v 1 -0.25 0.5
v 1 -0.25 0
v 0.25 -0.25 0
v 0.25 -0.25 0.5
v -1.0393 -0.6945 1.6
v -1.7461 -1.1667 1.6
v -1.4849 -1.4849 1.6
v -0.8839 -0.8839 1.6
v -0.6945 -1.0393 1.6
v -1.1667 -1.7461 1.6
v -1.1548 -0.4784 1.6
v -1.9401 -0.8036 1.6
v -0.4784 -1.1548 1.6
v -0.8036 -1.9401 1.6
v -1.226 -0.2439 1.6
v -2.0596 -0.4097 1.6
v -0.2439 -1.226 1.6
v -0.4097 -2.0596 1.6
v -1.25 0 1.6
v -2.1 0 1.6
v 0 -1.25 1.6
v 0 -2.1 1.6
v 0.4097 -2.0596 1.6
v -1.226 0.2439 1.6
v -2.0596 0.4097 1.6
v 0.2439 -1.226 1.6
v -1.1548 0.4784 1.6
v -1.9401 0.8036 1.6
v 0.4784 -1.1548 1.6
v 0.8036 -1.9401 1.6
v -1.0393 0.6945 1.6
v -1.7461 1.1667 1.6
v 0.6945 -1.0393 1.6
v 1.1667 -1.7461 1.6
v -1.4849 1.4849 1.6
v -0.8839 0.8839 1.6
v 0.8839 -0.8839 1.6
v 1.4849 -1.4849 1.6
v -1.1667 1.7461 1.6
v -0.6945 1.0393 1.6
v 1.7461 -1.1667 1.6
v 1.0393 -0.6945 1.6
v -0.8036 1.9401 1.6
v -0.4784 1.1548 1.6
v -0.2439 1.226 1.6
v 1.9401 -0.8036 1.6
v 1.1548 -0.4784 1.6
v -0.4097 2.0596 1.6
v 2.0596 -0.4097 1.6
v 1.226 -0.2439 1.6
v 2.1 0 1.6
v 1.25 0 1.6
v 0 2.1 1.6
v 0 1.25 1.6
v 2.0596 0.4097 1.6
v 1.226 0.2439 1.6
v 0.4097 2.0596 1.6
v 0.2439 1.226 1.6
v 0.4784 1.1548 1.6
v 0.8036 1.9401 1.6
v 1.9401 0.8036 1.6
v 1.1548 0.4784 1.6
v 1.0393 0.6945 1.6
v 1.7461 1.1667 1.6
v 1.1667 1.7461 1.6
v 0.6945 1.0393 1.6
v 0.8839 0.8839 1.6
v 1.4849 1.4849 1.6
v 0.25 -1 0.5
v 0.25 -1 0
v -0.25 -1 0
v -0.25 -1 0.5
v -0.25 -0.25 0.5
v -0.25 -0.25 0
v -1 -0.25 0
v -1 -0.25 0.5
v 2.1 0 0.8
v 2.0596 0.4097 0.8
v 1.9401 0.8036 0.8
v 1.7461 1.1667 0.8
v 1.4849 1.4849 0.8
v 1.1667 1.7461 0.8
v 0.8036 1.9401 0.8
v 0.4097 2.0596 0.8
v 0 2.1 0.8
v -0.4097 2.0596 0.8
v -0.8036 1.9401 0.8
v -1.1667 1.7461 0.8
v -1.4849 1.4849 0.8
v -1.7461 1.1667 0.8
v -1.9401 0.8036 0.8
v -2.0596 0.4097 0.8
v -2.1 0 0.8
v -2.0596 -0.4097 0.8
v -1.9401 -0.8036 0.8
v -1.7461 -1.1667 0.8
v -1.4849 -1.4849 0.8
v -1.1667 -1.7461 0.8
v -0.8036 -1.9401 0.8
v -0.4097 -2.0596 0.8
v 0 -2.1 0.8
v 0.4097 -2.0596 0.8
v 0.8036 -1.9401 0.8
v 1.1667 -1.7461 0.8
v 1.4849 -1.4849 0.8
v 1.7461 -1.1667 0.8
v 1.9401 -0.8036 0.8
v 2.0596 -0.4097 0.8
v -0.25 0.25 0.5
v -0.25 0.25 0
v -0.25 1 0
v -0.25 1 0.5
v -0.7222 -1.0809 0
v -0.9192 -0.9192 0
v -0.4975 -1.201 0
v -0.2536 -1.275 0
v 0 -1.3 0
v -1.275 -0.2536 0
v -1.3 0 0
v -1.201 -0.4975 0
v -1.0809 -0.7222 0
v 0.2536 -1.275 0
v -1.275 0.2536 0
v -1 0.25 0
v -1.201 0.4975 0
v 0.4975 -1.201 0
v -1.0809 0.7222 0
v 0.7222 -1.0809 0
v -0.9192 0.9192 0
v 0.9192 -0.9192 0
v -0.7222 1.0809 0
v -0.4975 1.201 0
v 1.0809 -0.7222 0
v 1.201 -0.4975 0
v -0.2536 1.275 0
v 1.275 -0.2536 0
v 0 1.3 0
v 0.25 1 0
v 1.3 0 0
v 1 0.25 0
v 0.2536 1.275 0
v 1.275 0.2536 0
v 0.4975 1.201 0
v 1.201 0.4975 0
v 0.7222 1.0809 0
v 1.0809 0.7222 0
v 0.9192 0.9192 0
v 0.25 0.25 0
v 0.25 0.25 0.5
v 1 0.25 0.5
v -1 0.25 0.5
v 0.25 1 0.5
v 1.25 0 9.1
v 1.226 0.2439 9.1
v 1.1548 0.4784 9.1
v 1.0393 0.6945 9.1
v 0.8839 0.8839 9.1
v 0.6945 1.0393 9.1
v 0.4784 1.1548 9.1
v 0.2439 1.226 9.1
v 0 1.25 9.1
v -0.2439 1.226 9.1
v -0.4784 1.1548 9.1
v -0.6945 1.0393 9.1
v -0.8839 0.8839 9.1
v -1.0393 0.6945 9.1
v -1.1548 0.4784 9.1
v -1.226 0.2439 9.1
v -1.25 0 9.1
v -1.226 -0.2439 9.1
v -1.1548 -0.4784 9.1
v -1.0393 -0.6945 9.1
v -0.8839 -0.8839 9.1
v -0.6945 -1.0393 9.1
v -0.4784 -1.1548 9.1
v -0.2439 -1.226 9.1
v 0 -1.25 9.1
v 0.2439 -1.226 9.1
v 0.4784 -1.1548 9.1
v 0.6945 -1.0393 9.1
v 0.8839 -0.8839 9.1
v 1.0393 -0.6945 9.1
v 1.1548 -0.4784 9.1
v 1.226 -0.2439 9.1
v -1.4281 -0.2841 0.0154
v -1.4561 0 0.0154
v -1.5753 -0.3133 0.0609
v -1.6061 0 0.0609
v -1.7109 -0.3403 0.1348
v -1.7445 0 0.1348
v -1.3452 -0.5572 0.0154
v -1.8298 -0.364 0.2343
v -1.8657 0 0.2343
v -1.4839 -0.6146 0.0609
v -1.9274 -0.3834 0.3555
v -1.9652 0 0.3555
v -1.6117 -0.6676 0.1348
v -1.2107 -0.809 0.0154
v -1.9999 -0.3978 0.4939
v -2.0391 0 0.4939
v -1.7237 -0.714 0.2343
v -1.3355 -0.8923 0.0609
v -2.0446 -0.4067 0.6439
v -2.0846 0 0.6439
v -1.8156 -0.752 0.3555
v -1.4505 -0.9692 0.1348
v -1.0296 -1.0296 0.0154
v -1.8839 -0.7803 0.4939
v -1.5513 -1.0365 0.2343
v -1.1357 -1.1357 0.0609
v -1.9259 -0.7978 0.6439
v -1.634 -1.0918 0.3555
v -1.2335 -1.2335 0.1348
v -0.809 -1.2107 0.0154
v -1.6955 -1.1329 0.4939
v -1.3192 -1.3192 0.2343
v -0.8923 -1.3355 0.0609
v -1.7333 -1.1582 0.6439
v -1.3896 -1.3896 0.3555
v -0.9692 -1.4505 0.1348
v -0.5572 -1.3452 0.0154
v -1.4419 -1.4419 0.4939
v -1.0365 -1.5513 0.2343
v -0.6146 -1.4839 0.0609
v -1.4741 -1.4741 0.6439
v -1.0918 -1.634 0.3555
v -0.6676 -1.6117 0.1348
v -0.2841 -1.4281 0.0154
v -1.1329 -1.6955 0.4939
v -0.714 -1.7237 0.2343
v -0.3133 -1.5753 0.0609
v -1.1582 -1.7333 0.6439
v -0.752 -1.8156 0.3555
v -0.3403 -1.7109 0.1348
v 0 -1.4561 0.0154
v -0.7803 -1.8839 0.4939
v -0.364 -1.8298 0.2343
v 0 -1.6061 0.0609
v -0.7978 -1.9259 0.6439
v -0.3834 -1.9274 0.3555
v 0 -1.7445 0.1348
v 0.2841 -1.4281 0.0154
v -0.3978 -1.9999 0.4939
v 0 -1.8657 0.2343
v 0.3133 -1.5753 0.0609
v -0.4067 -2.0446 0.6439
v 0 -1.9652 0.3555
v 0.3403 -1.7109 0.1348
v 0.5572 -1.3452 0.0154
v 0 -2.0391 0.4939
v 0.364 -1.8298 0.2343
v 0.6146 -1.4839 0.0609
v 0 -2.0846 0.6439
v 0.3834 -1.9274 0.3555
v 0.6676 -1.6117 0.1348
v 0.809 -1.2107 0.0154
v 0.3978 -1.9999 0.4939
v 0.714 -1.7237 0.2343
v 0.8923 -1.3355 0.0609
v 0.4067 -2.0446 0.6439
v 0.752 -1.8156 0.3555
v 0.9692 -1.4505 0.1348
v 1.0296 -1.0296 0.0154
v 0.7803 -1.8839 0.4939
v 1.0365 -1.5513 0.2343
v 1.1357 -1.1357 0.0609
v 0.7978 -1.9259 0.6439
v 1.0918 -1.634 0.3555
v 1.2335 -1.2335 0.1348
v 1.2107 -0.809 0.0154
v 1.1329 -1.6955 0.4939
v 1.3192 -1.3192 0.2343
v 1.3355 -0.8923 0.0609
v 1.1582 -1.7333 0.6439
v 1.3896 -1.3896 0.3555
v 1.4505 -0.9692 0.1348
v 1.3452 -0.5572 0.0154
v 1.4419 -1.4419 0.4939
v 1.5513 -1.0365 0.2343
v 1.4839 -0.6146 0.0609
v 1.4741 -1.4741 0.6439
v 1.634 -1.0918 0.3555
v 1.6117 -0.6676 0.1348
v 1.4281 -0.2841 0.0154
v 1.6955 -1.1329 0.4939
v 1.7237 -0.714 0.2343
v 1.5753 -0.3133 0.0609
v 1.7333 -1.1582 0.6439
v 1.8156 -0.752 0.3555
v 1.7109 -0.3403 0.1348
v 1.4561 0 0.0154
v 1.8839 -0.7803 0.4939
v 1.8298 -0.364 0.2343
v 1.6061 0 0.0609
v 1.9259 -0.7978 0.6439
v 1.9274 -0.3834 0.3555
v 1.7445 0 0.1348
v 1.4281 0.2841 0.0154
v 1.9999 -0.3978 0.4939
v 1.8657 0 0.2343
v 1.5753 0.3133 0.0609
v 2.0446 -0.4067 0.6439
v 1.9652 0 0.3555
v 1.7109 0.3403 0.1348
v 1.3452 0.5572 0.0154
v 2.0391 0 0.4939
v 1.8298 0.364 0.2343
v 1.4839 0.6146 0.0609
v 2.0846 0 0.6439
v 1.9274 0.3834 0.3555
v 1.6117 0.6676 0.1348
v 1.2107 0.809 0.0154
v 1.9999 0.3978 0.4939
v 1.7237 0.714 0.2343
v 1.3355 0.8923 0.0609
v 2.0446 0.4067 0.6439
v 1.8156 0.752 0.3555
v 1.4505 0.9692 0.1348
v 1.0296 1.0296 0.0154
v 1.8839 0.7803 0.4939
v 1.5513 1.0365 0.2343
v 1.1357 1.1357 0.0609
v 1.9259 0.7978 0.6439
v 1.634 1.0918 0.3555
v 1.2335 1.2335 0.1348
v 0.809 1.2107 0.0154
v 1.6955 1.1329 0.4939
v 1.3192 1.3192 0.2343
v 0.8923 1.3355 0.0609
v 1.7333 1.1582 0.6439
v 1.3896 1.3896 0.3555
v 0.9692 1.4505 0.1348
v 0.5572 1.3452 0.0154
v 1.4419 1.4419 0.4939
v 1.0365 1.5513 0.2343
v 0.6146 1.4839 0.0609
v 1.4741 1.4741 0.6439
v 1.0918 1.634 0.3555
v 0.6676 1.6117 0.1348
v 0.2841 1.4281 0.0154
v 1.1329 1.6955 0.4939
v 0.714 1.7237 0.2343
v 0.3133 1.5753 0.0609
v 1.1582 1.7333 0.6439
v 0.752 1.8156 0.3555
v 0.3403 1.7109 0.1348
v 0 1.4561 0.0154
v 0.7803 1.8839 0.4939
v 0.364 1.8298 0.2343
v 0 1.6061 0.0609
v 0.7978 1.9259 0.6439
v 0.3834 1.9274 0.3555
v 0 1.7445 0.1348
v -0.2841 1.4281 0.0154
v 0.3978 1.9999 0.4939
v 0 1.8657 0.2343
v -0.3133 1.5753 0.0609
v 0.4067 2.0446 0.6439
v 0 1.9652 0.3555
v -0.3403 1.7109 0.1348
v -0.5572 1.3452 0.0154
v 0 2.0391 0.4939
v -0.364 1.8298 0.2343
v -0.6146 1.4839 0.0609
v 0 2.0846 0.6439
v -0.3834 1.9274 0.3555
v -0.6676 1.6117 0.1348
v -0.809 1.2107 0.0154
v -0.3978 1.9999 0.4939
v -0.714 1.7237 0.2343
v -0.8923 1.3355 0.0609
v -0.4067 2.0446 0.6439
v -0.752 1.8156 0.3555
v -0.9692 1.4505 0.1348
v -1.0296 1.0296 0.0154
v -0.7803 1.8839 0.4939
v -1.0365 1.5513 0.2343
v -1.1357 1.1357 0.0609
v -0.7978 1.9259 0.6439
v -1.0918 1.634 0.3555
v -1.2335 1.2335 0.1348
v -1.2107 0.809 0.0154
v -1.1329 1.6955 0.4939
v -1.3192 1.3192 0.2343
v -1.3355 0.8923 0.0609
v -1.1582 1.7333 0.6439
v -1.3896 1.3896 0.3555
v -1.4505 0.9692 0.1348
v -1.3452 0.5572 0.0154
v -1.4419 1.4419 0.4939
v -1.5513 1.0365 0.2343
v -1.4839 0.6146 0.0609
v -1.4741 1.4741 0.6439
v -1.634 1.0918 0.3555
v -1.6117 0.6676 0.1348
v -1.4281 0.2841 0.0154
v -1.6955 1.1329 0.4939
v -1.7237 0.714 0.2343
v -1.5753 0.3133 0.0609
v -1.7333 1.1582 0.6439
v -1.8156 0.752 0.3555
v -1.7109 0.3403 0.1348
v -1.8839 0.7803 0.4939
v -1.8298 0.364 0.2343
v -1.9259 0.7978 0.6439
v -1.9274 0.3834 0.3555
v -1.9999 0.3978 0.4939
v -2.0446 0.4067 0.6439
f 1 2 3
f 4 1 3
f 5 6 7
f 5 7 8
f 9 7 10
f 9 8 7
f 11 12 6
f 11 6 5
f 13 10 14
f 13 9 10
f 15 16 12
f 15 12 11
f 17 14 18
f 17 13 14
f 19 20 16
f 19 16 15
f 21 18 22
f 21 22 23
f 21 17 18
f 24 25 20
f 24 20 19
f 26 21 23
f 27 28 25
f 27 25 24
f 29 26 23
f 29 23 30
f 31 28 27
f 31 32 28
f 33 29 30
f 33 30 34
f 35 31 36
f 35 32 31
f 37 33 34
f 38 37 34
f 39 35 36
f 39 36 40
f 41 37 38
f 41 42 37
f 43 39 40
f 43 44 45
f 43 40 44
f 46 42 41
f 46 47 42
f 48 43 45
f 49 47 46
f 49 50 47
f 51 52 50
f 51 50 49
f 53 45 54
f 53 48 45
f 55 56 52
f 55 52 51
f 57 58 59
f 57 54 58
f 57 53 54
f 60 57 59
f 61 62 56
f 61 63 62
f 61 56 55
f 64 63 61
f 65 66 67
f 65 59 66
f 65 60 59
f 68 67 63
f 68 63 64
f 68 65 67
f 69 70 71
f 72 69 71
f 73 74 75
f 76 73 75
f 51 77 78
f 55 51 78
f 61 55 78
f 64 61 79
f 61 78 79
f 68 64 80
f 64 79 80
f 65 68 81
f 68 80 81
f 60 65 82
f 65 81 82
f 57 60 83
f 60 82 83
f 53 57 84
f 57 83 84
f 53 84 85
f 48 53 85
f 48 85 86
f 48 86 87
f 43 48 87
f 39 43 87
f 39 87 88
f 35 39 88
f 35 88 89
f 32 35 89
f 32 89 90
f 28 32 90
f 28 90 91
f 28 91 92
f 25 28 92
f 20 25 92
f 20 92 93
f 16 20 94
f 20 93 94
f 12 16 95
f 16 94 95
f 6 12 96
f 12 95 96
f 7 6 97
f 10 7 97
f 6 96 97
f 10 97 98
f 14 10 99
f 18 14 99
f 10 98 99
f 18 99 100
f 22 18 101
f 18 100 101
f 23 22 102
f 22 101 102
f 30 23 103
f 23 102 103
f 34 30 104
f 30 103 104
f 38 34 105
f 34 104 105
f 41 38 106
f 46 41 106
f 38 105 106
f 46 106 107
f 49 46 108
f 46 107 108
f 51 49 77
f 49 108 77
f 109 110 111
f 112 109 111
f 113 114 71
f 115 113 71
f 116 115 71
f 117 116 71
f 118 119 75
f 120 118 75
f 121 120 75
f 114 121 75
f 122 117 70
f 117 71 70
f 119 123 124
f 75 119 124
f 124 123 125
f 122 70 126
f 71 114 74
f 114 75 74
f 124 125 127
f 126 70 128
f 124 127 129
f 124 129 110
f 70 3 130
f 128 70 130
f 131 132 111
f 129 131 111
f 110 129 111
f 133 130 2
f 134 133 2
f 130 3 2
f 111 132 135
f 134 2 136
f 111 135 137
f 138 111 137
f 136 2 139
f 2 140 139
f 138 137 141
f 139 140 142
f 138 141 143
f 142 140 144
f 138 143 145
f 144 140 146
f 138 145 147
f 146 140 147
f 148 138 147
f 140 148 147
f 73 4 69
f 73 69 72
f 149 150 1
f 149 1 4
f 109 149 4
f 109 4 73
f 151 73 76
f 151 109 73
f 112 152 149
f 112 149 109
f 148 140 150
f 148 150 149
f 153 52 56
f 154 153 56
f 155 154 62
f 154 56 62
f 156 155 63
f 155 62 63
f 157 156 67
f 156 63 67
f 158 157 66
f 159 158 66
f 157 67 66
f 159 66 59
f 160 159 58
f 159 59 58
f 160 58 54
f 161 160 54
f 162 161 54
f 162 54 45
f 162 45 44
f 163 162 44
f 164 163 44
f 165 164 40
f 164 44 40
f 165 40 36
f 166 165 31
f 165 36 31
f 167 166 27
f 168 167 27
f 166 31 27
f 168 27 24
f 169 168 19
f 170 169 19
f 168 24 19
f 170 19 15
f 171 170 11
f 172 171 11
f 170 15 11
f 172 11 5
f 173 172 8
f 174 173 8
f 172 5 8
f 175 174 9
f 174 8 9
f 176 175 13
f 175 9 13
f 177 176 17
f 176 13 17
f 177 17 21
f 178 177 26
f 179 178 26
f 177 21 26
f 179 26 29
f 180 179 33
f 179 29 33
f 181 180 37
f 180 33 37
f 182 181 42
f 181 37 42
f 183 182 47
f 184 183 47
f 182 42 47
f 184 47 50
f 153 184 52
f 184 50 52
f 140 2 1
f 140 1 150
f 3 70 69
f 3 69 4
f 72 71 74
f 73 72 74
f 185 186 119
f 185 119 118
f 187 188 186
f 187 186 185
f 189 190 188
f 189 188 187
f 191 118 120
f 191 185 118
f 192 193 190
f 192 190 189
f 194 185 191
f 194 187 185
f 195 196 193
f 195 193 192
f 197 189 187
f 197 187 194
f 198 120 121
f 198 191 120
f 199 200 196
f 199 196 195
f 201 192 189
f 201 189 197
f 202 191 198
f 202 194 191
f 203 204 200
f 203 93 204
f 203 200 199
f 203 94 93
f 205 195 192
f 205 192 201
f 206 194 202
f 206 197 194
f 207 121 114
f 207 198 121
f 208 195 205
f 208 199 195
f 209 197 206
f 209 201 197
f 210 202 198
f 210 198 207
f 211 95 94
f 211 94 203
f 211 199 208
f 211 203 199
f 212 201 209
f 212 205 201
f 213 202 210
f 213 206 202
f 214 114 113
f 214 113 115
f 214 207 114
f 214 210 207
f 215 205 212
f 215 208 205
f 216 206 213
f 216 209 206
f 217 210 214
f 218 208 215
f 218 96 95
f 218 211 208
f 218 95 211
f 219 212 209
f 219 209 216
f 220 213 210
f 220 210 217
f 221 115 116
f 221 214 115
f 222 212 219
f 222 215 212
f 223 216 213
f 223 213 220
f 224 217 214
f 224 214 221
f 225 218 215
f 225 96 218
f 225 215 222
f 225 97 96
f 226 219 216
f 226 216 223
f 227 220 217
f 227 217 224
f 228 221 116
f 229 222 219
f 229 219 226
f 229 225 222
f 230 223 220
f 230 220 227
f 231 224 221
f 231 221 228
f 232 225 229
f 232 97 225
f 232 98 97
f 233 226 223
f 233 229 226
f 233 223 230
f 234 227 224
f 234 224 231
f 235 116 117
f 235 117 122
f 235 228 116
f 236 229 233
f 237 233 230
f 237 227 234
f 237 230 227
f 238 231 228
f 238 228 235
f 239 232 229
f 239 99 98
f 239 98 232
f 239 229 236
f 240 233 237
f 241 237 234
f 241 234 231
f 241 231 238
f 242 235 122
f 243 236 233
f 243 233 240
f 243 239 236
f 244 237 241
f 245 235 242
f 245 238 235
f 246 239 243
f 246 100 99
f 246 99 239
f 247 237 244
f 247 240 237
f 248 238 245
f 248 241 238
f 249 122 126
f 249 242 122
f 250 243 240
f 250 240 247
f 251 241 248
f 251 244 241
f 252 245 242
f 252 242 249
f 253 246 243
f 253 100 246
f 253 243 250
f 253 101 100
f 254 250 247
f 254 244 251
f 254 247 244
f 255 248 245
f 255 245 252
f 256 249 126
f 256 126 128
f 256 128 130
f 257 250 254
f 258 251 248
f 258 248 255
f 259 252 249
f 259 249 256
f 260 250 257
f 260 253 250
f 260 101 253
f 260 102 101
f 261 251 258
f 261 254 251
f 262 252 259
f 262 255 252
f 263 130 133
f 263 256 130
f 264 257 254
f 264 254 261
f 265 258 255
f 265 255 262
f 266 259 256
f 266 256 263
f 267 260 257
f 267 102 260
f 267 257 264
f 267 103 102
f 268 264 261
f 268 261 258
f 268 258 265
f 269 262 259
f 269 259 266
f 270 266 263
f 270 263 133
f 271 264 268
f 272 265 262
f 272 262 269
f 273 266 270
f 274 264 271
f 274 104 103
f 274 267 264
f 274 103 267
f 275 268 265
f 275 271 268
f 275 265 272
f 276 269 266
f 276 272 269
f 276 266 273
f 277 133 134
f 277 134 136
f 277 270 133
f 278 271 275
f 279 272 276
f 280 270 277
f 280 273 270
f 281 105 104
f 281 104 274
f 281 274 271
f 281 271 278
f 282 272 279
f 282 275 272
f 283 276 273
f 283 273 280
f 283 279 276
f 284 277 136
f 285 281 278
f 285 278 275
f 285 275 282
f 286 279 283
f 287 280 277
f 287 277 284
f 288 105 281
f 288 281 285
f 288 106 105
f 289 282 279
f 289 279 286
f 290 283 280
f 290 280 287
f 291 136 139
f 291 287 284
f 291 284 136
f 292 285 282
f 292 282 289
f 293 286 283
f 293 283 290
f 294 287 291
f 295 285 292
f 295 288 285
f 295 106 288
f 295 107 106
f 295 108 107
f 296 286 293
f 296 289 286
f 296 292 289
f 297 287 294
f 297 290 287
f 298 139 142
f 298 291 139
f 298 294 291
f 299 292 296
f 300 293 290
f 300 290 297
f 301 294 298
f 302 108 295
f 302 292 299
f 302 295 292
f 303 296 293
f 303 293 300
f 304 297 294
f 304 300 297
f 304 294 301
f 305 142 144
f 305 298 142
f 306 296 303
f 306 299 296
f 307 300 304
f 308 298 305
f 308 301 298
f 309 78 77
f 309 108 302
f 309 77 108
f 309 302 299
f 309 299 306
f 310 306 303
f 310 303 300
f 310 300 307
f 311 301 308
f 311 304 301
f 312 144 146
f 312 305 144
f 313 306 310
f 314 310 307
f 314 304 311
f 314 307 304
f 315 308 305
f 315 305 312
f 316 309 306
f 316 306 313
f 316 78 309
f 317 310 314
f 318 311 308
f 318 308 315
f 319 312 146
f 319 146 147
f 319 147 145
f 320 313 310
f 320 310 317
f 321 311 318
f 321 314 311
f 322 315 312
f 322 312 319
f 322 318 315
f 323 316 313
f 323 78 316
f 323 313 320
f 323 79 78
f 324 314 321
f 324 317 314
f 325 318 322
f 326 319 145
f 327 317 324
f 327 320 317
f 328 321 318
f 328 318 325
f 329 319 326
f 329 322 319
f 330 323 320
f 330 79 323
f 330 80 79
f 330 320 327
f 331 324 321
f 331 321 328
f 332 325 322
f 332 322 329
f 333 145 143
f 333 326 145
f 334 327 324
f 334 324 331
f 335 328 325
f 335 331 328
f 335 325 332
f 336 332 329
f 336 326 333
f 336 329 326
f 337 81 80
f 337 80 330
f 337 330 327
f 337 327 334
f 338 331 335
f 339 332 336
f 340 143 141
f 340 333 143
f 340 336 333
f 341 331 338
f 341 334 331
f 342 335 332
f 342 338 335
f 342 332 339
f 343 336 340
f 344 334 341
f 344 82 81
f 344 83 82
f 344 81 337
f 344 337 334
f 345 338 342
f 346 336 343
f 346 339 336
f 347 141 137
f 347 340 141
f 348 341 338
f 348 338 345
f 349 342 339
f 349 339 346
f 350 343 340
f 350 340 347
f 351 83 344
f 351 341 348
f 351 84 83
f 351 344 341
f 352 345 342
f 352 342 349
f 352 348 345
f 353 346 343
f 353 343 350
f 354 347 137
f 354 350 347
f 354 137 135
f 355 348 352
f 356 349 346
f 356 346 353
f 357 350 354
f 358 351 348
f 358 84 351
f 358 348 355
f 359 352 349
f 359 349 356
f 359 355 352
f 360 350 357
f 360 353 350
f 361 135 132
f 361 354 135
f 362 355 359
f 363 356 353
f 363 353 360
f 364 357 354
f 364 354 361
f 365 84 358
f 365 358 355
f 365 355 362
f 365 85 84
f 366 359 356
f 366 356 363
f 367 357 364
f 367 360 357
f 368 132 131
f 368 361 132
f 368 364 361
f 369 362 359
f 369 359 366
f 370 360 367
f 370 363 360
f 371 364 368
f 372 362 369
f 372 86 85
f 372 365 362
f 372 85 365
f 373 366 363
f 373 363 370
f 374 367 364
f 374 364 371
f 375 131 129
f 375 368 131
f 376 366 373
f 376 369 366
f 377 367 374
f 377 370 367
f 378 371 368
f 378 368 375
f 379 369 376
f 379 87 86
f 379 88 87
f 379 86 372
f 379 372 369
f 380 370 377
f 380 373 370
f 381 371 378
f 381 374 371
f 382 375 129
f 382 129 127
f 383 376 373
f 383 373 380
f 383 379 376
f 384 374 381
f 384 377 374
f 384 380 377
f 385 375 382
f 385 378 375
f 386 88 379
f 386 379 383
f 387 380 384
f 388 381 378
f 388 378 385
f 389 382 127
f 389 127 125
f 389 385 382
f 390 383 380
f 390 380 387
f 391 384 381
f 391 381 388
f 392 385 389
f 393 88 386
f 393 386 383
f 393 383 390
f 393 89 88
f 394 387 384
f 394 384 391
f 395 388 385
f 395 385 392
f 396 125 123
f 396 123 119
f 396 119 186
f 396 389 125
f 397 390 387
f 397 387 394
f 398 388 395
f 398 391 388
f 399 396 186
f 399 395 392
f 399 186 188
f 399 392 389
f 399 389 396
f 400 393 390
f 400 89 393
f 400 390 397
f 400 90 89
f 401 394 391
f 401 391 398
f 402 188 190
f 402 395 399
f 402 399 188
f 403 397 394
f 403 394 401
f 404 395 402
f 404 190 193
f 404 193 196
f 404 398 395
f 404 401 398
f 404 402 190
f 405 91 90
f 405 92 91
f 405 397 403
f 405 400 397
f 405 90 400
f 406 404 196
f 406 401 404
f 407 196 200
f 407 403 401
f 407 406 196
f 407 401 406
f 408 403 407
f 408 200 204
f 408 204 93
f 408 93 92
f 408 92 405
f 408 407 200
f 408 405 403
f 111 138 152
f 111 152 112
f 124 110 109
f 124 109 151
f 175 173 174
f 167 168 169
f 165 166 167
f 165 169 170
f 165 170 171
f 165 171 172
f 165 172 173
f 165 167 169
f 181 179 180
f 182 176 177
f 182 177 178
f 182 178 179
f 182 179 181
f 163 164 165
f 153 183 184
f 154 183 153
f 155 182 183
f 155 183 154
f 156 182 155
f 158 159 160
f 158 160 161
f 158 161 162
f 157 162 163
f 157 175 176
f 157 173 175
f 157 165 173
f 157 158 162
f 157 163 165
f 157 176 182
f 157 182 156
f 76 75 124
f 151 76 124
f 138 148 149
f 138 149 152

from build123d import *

# Parameters (mm, degrees)
SKETCH1_R           = 2.1
BOSS_EXTRUDE1_DEPTH = 1.6
SKETCH3_W           = 0.5
SKETCH3_H           = 0.75
SKETCH3_W_2         = 0.75
SKETCH3_H_2         = 0.5
CUT_EXTRUDE1_DEPTH  = 0.5
SKETCH4_R           = 1.25
BOSS_EXTRUDE2_DEPTH = 7.5


with BuildPart() as part:
    # Sketch1 → Boss-Extrude1 (new body)
    with BuildSketch(Plane.XY):
        Circle(SKETCH1_R)
    extrude(amount=BOSS_EXTRUDE1_DEPTH)

    # Sketch2 → Cut-Revolve1 (revolve, cut)
    with BuildSketch(Plane(origin=(0, 0, 0), x_dir=(1, 0, 0), z_dir=(0, 1, 0))):
        with BuildLine():
            Line((-2.1, -0.8), (-2.1, 0))
            Line((-2.1, 0), (-1.3, 0))
            ThreePointArc((-1.3, 0), (-1.865685425, -0.234314575), (-2.1, -0.8))
        make_face()
    revolve(axis=Axis((0, 0, 0), (0, 0, 1)), mode=Mode.SUBTRACT)

    # Sketch3 → Cut-Extrude1 (cut)
    with BuildSketch(Plane(origin=(0, 0, 0), x_dir=(-1, 0, 0), z_dir=(0, 0, -1))):
        with Locations((0, -0.625)):
            Rectangle(SKETCH3_W, SKETCH3_H)
        with Locations((0.625, 0)):
            Rectangle(SKETCH3_W_2, SKETCH3_H_2)
        with Locations((-0.625, 0)):
            Rectangle(SKETCH3_W_2, SKETCH3_H_2)
        with Locations((0, 0.625)):
            Rectangle(SKETCH3_W, SKETCH3_H)
        Rectangle(SKETCH3_W, SKETCH3_H_2)
    extrude(amount=-CUT_EXTRUDE1_DEPTH, mode=Mode.SUBTRACT)

    # Sketch4 → Boss-Extrude2 (add)
    with BuildSketch(Plane.XY.offset(1.6)):
        Circle(SKETCH4_R)
    extrude(amount=BOSS_EXTRUDE2_DEPTH)


solid = part.part
